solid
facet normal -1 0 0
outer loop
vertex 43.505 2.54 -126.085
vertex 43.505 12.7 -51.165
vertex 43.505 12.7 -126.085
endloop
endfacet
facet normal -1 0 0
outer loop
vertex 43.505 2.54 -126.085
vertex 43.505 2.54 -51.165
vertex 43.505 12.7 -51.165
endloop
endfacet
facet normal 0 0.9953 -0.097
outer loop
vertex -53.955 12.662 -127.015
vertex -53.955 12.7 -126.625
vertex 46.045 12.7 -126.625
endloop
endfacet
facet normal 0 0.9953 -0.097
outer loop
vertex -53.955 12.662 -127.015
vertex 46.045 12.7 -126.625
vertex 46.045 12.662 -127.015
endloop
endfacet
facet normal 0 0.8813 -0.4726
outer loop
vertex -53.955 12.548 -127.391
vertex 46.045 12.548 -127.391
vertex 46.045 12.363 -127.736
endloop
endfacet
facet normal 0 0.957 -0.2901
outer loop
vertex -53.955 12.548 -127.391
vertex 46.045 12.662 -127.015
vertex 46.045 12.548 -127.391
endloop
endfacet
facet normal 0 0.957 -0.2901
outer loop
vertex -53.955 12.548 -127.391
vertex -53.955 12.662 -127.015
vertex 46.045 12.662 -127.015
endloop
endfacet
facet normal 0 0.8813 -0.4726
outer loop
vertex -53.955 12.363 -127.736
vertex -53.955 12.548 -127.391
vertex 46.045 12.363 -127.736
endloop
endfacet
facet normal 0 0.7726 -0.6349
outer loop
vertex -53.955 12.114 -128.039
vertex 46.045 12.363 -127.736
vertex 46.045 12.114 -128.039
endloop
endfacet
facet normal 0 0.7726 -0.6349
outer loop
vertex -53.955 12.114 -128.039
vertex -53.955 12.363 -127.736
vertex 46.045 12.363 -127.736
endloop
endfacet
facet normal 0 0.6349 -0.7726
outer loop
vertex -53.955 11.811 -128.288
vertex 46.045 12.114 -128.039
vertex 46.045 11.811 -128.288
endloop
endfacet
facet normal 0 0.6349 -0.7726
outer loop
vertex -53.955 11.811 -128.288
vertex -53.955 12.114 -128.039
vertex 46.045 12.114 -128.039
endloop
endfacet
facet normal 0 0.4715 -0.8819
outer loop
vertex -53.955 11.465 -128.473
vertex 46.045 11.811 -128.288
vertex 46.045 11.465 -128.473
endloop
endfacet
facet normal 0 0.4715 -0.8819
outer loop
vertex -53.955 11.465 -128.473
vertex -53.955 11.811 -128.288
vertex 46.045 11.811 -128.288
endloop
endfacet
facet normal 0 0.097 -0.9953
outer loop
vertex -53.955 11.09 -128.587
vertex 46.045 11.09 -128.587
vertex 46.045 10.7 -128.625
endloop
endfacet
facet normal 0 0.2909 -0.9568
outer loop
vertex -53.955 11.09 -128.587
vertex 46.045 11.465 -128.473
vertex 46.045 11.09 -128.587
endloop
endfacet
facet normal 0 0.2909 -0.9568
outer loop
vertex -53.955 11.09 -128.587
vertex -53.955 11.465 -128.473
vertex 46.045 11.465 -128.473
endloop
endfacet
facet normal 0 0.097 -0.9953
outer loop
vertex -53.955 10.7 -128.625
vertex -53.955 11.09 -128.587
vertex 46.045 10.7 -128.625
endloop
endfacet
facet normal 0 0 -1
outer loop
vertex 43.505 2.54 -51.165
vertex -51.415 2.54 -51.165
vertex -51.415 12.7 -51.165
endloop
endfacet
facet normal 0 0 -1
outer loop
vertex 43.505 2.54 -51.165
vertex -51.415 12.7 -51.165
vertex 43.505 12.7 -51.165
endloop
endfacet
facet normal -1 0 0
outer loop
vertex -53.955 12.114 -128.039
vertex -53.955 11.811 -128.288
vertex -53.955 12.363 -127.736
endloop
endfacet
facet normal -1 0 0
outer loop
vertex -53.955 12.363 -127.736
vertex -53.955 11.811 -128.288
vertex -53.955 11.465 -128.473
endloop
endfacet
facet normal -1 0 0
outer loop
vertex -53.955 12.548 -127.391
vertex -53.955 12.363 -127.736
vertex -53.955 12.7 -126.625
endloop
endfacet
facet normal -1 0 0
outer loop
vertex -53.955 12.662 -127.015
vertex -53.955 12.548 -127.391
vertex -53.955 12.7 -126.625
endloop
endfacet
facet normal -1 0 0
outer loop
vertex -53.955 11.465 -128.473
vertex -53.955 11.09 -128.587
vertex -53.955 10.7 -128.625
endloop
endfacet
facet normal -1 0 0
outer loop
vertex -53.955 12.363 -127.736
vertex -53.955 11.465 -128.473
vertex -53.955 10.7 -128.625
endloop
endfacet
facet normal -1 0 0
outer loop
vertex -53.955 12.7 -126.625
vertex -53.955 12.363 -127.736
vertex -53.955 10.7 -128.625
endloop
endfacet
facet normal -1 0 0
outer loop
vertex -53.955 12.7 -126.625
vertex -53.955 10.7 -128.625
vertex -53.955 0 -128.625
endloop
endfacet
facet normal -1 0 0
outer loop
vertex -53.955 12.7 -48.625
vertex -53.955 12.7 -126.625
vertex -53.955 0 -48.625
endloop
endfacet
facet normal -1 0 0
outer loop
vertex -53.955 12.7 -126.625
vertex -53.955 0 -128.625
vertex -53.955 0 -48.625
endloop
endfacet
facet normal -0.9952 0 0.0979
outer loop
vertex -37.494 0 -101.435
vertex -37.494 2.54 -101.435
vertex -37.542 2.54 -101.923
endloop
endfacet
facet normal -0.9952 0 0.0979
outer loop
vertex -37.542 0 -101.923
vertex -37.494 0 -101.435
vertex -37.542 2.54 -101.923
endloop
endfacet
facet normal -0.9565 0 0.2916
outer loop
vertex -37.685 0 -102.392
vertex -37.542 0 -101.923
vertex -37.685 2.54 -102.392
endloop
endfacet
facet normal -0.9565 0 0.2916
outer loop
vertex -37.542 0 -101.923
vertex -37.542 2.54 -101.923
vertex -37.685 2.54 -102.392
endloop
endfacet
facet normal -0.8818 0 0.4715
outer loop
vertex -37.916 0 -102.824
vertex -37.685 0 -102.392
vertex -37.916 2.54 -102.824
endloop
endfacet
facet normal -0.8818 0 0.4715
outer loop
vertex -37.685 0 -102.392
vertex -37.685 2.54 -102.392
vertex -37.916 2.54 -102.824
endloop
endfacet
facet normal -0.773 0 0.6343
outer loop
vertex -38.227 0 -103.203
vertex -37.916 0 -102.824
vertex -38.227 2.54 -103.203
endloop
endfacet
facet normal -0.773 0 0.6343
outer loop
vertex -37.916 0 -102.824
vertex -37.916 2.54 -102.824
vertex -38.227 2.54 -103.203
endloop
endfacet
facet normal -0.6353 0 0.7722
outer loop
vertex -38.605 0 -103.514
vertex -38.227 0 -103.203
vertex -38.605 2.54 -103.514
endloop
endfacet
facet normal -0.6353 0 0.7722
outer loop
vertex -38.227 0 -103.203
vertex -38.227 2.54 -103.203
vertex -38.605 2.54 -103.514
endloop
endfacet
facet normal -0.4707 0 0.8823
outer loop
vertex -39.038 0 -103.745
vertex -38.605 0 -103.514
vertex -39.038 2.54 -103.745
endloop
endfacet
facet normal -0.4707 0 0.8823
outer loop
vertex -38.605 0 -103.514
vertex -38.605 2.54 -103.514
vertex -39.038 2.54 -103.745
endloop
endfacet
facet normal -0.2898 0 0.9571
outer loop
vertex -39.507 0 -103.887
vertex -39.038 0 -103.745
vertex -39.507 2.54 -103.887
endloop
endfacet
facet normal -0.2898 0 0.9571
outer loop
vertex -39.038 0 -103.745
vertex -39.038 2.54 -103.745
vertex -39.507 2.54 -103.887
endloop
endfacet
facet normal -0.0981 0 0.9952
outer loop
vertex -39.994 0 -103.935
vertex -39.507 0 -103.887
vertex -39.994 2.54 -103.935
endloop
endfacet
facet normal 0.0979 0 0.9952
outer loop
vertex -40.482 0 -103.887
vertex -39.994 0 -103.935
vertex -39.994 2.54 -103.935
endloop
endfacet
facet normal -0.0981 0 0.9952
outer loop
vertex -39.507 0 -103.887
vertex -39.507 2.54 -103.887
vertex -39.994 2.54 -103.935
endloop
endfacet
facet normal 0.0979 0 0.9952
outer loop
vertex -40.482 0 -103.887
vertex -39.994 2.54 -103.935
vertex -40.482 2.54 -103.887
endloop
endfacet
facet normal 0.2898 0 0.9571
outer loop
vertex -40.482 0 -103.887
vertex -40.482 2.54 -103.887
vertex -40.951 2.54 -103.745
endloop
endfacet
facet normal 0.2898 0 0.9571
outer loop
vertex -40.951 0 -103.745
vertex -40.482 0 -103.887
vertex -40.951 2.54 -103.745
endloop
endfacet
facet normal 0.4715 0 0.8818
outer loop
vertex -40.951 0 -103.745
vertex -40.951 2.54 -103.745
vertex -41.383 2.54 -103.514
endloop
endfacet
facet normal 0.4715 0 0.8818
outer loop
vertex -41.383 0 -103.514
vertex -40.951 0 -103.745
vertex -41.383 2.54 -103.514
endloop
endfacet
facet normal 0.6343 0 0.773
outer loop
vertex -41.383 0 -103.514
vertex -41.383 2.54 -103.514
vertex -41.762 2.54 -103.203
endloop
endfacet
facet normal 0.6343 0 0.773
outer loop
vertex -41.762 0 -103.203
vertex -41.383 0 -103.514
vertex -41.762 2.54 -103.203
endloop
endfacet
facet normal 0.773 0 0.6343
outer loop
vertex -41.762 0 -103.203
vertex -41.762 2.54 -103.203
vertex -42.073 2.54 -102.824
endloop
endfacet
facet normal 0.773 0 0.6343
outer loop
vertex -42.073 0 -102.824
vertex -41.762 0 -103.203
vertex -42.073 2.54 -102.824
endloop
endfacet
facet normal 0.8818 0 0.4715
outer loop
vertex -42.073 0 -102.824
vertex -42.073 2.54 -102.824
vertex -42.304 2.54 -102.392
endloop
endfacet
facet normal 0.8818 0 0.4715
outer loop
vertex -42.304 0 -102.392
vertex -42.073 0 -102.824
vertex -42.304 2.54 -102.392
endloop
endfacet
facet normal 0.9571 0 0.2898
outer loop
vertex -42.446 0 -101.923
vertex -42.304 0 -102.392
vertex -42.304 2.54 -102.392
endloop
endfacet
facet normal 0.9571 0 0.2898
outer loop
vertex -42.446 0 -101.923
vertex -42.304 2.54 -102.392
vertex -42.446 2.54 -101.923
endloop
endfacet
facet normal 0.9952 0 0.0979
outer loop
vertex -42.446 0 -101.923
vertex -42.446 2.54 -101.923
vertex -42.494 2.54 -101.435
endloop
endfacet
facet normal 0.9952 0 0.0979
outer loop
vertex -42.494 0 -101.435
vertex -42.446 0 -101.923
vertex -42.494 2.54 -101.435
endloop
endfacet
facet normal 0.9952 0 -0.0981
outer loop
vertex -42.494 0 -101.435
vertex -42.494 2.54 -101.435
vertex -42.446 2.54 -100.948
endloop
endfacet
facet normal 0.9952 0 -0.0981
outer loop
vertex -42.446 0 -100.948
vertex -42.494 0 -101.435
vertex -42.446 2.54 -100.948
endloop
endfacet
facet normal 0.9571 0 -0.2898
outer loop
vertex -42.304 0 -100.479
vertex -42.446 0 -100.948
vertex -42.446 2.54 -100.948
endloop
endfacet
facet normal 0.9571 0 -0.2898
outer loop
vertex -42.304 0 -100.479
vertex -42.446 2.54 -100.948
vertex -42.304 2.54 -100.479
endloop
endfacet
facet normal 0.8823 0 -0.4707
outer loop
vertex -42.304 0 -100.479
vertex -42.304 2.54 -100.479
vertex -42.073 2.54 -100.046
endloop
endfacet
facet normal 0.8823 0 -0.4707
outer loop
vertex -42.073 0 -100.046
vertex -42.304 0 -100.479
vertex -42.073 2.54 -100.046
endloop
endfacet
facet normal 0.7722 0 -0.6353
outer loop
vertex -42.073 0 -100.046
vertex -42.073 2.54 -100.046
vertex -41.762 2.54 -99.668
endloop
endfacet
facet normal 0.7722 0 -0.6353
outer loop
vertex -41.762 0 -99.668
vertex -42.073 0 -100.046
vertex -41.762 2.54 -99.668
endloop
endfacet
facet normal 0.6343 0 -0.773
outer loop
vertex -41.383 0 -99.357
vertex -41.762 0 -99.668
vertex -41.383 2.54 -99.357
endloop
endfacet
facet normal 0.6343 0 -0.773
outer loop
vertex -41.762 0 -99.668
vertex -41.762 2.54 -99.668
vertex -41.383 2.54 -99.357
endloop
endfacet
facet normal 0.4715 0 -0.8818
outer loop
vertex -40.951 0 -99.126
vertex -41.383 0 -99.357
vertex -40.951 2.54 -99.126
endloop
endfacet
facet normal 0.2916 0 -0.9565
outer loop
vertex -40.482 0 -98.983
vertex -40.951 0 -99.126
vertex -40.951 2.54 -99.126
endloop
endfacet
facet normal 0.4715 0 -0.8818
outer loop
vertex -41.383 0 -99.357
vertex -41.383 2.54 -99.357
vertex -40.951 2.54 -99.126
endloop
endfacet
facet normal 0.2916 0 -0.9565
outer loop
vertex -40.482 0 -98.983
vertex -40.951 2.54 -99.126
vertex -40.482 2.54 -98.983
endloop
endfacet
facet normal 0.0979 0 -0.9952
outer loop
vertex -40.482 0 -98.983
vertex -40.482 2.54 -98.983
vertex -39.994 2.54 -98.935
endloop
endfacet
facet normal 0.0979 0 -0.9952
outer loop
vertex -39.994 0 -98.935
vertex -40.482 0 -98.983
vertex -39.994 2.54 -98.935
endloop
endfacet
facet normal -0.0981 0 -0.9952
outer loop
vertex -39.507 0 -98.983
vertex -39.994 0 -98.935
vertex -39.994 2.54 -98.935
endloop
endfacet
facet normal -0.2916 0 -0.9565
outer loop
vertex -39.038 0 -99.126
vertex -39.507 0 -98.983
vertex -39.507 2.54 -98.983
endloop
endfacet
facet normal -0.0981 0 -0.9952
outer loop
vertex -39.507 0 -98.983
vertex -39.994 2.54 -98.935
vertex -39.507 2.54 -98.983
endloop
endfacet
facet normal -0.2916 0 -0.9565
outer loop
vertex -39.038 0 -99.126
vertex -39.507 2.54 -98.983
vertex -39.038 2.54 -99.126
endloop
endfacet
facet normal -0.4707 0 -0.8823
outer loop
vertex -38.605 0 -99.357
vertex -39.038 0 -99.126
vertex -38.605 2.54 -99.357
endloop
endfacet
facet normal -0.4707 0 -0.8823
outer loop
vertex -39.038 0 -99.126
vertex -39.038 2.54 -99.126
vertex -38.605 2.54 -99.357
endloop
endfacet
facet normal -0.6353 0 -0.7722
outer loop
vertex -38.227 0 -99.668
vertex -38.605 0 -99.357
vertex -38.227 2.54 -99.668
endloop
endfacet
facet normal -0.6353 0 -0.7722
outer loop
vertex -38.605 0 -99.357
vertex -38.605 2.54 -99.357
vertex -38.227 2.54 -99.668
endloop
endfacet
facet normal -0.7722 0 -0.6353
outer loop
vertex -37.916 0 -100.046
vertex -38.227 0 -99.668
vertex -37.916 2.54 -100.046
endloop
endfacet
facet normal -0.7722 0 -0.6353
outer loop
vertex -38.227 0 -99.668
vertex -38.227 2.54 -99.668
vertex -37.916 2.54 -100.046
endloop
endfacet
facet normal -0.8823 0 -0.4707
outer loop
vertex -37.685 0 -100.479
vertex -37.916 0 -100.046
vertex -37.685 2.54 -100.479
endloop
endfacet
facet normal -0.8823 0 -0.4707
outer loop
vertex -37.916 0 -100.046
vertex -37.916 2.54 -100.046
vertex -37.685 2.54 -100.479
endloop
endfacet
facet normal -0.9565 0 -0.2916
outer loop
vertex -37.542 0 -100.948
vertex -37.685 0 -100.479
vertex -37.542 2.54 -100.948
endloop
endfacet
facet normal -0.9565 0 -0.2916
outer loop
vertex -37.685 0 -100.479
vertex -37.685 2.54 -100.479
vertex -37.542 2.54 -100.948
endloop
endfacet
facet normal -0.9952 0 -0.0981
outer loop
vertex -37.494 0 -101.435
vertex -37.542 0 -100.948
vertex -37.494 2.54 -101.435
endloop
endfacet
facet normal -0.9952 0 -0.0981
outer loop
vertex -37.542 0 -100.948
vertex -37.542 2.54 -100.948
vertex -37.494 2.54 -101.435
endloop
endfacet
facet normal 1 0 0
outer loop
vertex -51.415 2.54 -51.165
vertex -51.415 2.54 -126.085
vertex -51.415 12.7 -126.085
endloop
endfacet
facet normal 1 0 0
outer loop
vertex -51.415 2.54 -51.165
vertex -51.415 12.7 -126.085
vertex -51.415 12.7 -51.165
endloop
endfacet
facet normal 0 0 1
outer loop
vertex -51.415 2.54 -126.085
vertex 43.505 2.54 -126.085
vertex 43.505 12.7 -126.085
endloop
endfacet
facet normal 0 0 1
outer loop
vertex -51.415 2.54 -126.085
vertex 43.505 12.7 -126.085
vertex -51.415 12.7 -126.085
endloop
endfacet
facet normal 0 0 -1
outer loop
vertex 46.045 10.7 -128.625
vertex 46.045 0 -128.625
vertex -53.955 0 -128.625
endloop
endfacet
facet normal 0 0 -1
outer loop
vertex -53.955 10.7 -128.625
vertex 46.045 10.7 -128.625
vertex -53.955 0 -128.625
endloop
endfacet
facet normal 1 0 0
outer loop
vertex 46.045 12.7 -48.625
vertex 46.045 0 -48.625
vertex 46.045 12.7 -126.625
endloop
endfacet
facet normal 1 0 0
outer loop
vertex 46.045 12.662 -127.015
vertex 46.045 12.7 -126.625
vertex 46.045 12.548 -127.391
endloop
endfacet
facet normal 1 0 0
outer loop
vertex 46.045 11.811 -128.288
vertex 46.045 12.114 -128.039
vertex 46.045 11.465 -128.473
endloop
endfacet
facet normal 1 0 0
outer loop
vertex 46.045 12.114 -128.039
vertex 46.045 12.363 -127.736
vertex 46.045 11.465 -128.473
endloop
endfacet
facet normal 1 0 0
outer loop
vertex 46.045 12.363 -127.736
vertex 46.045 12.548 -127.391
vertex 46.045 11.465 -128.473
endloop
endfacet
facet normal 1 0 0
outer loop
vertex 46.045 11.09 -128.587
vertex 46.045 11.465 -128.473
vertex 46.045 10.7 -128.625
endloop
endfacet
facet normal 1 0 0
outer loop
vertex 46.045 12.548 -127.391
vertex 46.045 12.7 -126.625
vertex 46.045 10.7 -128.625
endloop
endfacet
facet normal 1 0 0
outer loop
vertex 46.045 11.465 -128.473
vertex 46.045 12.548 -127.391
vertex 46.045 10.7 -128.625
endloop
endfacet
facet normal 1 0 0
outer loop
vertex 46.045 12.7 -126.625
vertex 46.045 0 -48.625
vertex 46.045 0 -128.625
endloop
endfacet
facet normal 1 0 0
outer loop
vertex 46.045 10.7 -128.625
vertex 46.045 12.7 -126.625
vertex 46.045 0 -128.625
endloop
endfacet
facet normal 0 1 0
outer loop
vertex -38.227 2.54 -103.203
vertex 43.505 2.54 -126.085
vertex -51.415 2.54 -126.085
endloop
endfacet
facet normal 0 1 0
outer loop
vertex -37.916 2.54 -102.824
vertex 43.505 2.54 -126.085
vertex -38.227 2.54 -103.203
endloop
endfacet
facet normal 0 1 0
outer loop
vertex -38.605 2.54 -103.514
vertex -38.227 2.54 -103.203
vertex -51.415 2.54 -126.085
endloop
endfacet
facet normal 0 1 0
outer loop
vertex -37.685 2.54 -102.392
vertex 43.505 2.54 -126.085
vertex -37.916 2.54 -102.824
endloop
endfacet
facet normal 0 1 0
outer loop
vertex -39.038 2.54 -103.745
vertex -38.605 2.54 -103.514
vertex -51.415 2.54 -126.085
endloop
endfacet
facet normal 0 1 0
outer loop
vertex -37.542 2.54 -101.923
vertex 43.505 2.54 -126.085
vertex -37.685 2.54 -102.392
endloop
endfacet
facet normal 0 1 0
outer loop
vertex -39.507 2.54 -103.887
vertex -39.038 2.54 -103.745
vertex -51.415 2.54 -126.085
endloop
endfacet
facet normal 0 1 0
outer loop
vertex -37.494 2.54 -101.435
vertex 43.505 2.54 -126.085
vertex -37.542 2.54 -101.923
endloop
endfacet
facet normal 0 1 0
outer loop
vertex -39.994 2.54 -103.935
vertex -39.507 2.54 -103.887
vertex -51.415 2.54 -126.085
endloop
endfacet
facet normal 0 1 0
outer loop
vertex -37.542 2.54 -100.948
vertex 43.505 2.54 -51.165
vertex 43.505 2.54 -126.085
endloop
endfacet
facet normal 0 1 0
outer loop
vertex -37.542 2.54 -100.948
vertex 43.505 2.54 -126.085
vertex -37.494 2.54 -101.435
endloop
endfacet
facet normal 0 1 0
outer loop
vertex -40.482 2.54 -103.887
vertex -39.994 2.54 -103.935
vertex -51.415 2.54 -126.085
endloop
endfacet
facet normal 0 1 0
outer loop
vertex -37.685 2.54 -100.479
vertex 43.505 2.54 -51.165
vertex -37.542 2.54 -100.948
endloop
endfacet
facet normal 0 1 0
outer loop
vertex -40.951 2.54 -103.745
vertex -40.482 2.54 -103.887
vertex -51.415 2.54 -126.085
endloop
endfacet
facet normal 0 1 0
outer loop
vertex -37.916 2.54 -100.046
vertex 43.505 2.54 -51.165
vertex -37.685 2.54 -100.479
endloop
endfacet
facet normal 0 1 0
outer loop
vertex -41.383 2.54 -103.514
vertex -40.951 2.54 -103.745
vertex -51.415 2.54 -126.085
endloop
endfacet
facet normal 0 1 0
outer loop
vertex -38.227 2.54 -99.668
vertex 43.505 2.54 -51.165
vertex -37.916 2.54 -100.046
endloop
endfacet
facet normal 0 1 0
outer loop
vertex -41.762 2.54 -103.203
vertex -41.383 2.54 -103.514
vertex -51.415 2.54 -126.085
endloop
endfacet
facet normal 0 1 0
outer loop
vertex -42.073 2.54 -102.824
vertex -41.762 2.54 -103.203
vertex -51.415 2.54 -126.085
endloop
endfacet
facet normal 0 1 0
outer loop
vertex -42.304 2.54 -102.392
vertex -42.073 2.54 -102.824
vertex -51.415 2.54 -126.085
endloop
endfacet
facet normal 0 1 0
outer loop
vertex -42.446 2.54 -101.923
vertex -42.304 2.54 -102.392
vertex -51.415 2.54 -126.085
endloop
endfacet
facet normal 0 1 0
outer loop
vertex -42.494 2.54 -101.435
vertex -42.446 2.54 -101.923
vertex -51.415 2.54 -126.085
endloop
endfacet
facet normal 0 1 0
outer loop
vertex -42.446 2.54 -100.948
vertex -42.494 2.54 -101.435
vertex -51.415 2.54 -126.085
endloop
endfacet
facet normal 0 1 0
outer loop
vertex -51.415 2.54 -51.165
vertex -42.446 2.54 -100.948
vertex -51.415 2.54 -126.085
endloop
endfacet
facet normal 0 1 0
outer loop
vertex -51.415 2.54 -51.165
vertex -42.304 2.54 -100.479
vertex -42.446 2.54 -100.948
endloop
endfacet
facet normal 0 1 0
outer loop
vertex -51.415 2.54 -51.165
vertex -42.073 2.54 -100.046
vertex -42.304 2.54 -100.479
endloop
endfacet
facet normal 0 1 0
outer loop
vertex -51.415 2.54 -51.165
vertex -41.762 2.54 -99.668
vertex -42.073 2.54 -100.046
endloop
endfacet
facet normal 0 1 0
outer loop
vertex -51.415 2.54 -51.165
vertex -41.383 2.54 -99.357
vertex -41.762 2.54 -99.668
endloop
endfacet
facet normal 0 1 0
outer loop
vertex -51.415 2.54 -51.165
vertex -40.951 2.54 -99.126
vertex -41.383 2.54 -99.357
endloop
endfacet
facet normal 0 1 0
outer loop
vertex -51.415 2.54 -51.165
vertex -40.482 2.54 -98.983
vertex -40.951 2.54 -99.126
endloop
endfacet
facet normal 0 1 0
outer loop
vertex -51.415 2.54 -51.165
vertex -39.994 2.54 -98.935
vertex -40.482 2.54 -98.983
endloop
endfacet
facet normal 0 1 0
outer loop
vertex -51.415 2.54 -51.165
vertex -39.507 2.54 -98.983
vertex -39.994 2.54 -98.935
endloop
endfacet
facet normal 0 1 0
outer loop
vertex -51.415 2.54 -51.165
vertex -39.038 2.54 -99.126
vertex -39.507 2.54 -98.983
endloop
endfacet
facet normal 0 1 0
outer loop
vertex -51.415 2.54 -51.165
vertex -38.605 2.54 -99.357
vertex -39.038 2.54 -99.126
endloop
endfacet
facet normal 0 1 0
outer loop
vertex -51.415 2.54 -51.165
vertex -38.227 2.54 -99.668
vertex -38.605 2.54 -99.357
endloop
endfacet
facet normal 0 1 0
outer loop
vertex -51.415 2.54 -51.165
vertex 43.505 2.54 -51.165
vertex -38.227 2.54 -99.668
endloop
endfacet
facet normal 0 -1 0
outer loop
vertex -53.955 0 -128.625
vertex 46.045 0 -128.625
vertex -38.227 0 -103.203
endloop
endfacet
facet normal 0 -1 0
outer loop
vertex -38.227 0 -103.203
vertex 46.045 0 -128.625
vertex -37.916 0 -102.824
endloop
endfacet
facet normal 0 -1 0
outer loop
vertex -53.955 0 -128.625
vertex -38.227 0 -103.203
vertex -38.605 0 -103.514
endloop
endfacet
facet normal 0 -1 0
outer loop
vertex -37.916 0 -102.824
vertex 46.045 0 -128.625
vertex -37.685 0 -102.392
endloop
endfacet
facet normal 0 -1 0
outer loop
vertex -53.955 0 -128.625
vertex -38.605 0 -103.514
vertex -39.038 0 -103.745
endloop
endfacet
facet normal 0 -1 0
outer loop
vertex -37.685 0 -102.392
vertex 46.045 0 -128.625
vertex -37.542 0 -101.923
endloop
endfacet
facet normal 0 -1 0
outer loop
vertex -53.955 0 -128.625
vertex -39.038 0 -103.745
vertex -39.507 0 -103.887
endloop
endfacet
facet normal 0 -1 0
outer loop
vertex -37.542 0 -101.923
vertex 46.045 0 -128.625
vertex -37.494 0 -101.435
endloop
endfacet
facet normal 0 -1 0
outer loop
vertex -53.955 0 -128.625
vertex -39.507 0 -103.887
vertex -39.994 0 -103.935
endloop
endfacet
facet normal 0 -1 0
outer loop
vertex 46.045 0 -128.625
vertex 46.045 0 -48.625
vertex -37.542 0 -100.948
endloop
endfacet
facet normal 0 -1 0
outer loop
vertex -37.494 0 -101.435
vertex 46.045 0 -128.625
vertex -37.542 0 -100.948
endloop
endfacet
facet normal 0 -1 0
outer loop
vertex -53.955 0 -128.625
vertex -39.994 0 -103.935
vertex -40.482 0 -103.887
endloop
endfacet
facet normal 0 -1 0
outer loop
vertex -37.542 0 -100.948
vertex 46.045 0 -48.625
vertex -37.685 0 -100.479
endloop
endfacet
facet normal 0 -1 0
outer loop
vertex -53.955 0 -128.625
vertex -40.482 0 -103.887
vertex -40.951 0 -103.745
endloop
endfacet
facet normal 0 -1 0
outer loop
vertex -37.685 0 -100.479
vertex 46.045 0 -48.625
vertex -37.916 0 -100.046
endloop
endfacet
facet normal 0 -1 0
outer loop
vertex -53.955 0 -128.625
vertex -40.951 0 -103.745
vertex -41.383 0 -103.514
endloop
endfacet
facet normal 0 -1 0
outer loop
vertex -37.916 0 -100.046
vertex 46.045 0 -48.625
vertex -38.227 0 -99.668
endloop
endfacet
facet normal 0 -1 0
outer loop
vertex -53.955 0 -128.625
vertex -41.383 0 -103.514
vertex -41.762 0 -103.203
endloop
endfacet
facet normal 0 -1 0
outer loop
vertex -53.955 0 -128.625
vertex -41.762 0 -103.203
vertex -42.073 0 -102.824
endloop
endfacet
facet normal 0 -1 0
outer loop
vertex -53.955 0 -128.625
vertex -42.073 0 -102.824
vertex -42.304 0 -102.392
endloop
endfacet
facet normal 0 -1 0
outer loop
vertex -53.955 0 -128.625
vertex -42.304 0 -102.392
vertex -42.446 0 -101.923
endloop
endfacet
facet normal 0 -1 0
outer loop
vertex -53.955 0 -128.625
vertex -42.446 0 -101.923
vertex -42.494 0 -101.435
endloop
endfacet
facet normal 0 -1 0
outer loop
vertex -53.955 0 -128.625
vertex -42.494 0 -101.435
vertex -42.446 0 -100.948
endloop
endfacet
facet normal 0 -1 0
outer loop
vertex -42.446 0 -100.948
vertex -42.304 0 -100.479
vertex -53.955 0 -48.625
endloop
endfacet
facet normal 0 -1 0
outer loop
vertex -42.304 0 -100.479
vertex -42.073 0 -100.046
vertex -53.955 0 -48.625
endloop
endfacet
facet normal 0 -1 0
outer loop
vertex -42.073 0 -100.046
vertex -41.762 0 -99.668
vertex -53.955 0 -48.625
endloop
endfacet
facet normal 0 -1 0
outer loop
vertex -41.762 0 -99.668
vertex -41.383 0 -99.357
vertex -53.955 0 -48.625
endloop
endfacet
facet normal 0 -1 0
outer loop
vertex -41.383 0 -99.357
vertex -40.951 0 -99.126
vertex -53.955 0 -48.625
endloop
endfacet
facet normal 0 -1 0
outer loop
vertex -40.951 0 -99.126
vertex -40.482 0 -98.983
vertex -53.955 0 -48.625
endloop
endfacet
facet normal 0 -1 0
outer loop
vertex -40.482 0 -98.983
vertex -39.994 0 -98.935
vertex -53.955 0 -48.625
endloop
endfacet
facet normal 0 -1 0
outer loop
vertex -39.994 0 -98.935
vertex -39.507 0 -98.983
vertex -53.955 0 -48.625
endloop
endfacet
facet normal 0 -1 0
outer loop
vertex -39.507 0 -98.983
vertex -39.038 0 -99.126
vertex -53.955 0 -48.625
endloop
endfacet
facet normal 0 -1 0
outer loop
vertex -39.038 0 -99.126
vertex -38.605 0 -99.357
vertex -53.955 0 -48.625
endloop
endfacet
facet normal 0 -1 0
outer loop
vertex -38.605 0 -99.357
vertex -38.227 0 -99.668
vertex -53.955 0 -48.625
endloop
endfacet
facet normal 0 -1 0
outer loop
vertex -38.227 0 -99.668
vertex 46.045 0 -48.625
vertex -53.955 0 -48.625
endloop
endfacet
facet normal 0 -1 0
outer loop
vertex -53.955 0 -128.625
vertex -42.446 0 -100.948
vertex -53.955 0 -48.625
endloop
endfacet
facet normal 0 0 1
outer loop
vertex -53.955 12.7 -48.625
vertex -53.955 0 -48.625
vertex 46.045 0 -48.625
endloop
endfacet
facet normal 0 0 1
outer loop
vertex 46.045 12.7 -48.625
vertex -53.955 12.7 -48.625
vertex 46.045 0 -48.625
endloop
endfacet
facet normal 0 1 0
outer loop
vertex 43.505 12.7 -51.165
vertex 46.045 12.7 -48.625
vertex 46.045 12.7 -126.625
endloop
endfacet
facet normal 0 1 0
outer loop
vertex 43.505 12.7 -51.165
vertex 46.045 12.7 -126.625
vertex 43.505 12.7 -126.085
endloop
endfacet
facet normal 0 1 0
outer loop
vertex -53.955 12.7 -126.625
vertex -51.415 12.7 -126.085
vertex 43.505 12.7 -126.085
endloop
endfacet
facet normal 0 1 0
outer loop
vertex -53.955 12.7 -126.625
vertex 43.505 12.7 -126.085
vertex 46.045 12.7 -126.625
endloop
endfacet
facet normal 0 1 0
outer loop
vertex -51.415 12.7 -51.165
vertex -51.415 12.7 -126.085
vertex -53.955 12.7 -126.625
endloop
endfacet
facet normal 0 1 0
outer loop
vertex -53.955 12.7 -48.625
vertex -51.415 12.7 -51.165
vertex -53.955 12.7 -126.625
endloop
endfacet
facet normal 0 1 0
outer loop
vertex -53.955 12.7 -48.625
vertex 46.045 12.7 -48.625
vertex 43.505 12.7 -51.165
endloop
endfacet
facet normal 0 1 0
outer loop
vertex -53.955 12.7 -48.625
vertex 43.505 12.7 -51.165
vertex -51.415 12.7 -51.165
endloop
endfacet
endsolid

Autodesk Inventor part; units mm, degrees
ref_plane "YZ Plane" through (0, 0, 0) normal (1, 0, 0) x (0, 1, 0)
ref_plane "XZ Plane" through (0, 0, 0) normal (0, 1, 0) x (-1, 0, 0)
ref_plane "XY Plane" through (0, 0, 0) normal (0, 0, 1) x (1, 0, 0)
sketch "Sketch1" plane through (0, 0, 0) normal (0, 1, 0) x (-1, 0, 0)
  line L0 (53.9548, -48.6252) -> (-46.0452, -48.6252)
  line L1 (-46.0452, -48.6252) -> (-46.0452, -128.6252)
  line L2 (-46.0452, -128.6252) -> (53.9548, -128.6252)
  line L3 (53.9548, -128.6252) -> (53.9548, -48.6252)
  point P0 (0, 0)
  dimension "d6" = 100
  dimension "d7" = 80
extrude "Extrusion1" add sketch "Sketch1" along normal blind 12.7
shell "Shell1" thickness 2.54 removed faces 1 at (12.7119, 12.7, -75.2919)
fillet "Fillet1" radius 2 1 edges at (-3.9548, 12.7, -128.6252)
sketch "Sketch2" plane through (-51.4148, 2.54, -126.0852) normal (0, 1, 0) x (1, 0, 0)
  circle A0 centre (11.4204, -24.6498) radius 2.5
  point P0 (51.4148, -126.0852)
  dimension "d8" = 5
extrude "Extrusion2" cut sketch "Sketch2" against normal blind 10
